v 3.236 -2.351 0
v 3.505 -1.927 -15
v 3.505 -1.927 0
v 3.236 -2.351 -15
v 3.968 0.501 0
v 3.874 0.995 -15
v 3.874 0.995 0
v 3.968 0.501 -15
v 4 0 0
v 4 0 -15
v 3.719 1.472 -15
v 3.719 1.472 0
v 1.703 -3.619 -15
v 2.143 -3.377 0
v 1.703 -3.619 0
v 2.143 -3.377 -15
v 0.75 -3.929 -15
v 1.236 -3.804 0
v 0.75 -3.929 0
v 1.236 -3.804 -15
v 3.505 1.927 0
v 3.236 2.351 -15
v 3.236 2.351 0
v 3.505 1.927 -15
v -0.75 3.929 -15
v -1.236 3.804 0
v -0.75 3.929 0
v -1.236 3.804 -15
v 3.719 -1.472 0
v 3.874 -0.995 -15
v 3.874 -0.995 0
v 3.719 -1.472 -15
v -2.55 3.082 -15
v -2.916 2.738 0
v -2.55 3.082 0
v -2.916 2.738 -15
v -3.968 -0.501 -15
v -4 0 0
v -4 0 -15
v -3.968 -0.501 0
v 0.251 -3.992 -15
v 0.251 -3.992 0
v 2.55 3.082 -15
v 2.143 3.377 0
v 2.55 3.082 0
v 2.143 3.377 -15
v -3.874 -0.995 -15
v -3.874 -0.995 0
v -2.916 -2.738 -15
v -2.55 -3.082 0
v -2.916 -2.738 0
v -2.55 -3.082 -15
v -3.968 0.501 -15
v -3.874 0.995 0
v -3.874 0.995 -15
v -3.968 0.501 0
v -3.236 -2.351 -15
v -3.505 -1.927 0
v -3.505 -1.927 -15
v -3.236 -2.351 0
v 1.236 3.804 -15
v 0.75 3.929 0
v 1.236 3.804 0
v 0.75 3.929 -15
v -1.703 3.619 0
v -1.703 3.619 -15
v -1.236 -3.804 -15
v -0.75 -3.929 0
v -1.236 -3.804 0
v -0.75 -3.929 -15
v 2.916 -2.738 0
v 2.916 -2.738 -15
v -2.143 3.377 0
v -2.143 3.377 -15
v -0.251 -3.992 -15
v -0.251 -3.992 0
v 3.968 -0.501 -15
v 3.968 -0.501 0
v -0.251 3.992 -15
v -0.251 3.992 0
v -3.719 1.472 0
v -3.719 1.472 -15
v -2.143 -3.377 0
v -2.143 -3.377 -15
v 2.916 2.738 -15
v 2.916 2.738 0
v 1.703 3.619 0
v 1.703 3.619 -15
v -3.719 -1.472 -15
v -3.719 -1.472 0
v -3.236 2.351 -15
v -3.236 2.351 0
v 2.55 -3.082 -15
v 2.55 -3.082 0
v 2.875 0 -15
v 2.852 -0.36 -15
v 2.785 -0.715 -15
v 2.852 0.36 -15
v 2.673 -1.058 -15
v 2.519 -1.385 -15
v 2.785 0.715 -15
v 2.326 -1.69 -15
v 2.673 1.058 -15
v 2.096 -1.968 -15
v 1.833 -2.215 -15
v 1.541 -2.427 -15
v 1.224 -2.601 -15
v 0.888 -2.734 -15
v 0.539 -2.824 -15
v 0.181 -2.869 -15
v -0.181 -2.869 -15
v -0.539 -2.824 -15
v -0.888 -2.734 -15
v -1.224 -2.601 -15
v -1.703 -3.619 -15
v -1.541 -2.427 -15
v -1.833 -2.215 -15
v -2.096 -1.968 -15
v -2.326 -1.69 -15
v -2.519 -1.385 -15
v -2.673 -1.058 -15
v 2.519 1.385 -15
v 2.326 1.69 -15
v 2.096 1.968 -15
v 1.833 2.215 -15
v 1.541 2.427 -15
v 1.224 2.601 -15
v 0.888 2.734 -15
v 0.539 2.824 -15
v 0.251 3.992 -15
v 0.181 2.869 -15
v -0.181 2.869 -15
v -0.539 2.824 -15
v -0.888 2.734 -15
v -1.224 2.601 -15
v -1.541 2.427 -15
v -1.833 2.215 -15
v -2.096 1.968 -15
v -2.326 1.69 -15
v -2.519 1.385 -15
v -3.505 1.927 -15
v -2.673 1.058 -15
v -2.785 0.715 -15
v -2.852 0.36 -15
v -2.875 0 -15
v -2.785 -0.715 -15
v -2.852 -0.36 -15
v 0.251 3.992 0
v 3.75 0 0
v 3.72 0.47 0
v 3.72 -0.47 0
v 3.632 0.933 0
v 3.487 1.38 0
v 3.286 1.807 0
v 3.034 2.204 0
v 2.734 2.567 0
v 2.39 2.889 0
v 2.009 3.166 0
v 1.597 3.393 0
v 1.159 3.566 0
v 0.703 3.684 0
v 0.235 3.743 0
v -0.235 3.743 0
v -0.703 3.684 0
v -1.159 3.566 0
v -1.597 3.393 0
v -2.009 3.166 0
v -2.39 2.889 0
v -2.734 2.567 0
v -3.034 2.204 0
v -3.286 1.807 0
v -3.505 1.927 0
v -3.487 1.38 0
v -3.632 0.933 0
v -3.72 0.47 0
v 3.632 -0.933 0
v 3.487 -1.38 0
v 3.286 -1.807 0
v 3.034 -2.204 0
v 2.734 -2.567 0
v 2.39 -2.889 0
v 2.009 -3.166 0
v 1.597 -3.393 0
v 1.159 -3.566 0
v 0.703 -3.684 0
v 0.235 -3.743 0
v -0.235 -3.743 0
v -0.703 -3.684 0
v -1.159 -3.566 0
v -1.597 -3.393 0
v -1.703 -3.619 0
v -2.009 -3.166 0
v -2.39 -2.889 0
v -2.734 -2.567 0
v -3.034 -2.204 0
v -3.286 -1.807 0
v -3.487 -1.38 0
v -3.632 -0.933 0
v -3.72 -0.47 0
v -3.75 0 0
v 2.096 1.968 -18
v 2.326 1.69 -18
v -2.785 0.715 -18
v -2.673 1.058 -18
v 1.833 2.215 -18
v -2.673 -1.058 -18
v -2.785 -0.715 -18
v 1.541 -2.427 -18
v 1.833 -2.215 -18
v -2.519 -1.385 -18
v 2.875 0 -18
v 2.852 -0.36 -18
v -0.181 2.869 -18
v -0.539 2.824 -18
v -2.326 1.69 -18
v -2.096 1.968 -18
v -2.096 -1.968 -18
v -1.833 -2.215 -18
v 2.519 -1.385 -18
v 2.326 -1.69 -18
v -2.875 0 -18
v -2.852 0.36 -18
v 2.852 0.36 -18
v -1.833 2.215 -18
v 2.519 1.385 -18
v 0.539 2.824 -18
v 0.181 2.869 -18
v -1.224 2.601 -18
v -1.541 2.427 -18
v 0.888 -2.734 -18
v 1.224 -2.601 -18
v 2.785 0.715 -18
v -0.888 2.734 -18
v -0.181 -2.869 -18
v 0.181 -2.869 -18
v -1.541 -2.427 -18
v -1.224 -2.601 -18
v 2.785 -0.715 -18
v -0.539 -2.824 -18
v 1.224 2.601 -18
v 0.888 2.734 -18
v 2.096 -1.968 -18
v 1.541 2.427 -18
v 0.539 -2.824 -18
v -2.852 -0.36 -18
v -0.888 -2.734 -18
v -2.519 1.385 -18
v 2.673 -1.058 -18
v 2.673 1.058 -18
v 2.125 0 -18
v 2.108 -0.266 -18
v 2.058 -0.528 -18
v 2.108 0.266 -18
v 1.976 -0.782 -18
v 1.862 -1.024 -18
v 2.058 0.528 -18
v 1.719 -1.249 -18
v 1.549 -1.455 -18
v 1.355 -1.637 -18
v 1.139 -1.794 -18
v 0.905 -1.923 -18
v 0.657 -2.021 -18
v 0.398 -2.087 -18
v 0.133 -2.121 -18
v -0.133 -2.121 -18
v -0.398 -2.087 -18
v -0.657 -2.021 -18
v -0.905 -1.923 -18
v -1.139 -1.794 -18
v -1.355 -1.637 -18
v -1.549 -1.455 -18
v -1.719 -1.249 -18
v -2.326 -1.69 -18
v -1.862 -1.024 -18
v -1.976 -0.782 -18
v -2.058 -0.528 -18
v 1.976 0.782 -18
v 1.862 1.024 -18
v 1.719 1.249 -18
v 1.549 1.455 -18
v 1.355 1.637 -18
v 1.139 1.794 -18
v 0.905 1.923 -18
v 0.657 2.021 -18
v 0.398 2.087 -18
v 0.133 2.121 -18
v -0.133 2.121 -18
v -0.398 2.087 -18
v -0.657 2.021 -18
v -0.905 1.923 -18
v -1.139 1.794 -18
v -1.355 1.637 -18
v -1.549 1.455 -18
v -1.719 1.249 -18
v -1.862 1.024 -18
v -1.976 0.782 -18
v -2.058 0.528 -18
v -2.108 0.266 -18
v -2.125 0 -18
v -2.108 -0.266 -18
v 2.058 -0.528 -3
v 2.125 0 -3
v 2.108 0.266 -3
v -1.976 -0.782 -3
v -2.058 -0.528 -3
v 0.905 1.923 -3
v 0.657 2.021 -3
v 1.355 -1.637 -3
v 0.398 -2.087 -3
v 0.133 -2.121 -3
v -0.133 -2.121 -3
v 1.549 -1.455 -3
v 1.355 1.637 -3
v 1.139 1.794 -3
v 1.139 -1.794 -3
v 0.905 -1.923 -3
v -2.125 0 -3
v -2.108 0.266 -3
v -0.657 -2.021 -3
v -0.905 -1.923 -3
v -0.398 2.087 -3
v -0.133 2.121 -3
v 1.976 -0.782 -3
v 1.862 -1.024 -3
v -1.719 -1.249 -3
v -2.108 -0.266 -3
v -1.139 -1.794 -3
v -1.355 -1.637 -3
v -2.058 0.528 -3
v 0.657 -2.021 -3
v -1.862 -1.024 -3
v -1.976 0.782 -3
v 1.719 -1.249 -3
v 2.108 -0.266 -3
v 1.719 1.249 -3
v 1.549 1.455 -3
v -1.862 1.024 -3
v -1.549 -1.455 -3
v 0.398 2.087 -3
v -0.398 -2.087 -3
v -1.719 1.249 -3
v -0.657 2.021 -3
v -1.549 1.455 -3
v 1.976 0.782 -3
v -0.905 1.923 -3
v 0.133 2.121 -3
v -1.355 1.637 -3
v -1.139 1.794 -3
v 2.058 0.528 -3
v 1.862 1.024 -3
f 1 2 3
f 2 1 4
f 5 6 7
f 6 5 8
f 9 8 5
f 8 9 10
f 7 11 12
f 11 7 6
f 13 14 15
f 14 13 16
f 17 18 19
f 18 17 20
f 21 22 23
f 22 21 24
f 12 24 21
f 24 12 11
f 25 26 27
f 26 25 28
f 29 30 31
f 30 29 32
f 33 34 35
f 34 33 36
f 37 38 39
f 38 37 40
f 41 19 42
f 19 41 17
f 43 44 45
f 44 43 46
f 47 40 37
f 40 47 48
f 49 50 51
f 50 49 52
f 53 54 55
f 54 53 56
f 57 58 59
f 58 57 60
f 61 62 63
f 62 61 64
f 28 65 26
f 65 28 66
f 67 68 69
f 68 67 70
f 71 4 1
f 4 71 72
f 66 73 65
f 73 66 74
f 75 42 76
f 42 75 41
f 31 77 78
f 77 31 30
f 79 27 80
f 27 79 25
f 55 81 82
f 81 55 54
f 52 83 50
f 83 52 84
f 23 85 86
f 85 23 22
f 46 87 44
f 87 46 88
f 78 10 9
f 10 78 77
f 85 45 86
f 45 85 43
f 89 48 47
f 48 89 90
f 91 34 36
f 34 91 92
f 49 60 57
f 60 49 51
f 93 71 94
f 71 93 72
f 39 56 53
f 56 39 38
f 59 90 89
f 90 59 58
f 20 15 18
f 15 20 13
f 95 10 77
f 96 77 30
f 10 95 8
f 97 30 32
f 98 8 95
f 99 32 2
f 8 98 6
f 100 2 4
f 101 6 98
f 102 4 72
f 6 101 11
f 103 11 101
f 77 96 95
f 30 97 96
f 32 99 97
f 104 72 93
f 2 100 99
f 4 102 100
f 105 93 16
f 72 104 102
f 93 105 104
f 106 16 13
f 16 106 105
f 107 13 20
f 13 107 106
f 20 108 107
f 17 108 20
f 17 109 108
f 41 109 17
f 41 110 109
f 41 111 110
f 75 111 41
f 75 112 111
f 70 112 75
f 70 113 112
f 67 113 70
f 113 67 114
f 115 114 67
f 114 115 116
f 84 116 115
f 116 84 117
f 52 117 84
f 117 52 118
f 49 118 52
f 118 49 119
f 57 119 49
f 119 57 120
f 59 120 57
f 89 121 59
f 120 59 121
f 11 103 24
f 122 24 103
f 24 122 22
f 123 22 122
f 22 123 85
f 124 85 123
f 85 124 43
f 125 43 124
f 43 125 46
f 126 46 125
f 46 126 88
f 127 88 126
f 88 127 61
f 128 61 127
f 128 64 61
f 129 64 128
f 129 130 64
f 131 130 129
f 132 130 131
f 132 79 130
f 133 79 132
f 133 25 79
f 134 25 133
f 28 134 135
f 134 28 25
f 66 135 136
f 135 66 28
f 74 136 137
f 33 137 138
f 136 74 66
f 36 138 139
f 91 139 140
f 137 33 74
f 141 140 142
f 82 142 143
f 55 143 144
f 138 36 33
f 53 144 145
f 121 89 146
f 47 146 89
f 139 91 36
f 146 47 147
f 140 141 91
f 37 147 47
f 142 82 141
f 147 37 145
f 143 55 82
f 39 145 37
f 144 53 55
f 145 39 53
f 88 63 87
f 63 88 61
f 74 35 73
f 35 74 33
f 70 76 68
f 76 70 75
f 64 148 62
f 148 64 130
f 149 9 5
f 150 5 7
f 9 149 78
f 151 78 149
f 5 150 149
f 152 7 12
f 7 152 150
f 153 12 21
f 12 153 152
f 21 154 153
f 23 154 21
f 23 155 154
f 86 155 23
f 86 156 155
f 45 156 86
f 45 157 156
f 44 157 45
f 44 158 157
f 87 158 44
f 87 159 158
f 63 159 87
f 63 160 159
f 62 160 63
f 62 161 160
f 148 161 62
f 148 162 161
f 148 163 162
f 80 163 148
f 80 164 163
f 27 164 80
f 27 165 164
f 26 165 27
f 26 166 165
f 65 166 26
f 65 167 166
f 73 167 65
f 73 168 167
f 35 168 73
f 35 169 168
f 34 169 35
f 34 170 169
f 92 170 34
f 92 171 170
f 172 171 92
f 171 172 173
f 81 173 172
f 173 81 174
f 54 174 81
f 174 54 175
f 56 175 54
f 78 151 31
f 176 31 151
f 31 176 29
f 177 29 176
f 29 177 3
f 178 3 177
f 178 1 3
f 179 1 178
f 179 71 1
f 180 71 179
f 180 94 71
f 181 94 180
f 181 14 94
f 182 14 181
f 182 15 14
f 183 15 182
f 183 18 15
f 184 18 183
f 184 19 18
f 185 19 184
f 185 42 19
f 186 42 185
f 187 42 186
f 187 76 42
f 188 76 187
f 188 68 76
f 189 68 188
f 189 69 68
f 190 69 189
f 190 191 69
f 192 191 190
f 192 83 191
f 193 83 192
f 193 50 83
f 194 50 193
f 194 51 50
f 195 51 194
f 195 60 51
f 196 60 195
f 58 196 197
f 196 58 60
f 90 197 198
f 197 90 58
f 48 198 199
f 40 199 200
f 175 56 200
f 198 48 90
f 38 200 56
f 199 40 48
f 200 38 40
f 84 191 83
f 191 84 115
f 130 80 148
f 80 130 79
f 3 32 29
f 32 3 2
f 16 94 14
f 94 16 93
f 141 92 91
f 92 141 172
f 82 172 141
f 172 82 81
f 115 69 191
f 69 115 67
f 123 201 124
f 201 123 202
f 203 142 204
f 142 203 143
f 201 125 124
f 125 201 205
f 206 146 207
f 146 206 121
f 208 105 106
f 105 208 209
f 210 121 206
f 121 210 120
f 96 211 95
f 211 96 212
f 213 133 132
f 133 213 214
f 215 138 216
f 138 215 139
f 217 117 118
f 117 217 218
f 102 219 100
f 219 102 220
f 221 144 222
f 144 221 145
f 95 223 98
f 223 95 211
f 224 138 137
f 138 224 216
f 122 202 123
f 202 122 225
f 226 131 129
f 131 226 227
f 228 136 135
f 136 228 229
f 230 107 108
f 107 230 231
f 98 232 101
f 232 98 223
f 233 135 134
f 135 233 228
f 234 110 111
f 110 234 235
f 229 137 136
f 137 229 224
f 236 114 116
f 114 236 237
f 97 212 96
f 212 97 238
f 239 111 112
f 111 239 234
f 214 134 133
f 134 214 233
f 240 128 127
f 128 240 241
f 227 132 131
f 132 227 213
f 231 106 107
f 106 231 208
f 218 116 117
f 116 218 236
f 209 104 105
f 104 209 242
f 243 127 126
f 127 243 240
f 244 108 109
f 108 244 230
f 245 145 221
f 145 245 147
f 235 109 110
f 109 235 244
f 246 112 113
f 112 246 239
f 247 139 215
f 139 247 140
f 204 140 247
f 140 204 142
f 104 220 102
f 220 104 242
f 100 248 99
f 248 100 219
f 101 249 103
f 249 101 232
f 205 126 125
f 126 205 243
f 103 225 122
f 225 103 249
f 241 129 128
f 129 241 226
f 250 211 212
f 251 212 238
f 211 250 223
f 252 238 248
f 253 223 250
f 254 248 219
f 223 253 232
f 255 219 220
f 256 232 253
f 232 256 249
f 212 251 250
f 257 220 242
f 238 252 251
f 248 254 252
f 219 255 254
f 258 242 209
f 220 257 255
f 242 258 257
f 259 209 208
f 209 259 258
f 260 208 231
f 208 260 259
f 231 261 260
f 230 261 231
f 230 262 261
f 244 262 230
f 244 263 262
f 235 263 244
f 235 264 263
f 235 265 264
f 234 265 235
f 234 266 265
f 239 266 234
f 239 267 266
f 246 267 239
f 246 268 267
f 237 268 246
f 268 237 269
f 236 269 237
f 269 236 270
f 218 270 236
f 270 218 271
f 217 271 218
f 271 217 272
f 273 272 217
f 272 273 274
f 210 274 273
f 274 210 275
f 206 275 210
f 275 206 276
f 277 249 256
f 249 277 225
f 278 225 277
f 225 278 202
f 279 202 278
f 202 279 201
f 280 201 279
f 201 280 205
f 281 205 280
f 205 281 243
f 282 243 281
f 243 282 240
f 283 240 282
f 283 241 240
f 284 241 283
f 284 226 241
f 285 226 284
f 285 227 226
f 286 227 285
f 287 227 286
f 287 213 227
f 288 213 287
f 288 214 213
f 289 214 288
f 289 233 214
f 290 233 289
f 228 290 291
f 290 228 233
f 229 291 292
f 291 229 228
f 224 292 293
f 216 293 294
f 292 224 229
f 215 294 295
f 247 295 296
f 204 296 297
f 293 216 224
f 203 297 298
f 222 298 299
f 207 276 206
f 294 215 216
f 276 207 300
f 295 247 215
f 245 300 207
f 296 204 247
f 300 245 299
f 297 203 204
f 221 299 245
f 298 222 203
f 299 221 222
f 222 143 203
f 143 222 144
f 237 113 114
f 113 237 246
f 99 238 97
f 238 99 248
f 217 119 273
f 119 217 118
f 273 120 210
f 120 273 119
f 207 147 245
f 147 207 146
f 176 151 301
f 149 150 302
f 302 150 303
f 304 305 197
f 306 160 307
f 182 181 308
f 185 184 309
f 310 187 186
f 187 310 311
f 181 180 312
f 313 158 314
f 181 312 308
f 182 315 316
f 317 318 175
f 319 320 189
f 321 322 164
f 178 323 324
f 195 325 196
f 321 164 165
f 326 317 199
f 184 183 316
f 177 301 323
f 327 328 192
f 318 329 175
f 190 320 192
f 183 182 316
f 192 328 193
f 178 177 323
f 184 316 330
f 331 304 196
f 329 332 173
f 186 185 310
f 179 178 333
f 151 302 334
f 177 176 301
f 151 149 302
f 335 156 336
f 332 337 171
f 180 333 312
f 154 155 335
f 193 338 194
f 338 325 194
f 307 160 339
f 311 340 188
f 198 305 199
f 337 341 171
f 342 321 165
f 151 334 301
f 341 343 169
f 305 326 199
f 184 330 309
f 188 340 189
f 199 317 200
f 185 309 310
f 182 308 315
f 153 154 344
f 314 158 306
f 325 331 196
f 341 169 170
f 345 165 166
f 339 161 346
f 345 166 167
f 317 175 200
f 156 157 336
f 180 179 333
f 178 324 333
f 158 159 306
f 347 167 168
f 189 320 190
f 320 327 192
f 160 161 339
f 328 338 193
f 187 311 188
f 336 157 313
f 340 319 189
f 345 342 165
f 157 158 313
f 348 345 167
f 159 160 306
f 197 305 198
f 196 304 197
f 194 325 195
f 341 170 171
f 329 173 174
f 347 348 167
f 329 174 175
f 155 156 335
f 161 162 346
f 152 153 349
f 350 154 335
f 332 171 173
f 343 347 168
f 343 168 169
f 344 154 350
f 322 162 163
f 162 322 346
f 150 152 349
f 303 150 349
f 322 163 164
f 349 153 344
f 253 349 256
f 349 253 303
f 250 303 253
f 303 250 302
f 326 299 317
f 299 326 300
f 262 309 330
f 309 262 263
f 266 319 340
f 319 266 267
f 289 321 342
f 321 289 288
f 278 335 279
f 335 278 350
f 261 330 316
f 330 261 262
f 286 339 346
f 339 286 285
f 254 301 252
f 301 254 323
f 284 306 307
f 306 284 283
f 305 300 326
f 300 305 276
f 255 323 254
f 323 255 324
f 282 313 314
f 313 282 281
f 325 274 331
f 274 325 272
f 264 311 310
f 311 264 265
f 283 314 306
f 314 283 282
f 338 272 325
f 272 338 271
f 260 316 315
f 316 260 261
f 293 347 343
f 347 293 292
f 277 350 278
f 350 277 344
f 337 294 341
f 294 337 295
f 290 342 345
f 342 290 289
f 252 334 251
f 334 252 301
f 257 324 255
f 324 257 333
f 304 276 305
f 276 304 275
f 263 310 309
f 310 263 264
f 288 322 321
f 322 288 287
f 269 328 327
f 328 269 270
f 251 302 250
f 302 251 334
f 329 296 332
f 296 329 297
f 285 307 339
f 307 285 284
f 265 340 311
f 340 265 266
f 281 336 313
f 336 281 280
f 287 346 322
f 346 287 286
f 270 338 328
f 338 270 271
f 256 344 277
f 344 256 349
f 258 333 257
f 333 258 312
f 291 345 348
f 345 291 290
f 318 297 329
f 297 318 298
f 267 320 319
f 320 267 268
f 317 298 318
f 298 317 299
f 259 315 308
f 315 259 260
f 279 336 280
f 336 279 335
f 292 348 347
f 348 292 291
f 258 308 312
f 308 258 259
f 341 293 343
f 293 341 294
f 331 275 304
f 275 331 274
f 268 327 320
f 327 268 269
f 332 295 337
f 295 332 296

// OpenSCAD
$fn = 50;

difference() {
	union() {
		translate(v = [0, 0, -15.0]) {
			cylinder(h = 15, r = 4.0);
		}
		#translate(v = [0, 0, -18.0]) {
			cylinder(h = 18, r = 2.875);
		}
	}
	union() {
		translate(v = [0, 0, 0]) {
			rotate(a = [0, 0, 0]) {
				difference() {
					union() {
						translate(v = [0, 0, -18.0]) {
							cylinder(h = 18, r = 2.0);
						}
						translate(v = [0, 0, -3]) {
							cylinder(h = 3, r1 = 2.125, r2 = 3.75);
						}
						translate(v = [0, 0, -18.0]) {
							cylinder(h = 18, r = 2.125);
						}
						translate(v = [0, 0, -18.0]) {
							cylinder(h = 18, r = 2.0);
						}
					}
					union();
				}
			}
		}
	}
}
